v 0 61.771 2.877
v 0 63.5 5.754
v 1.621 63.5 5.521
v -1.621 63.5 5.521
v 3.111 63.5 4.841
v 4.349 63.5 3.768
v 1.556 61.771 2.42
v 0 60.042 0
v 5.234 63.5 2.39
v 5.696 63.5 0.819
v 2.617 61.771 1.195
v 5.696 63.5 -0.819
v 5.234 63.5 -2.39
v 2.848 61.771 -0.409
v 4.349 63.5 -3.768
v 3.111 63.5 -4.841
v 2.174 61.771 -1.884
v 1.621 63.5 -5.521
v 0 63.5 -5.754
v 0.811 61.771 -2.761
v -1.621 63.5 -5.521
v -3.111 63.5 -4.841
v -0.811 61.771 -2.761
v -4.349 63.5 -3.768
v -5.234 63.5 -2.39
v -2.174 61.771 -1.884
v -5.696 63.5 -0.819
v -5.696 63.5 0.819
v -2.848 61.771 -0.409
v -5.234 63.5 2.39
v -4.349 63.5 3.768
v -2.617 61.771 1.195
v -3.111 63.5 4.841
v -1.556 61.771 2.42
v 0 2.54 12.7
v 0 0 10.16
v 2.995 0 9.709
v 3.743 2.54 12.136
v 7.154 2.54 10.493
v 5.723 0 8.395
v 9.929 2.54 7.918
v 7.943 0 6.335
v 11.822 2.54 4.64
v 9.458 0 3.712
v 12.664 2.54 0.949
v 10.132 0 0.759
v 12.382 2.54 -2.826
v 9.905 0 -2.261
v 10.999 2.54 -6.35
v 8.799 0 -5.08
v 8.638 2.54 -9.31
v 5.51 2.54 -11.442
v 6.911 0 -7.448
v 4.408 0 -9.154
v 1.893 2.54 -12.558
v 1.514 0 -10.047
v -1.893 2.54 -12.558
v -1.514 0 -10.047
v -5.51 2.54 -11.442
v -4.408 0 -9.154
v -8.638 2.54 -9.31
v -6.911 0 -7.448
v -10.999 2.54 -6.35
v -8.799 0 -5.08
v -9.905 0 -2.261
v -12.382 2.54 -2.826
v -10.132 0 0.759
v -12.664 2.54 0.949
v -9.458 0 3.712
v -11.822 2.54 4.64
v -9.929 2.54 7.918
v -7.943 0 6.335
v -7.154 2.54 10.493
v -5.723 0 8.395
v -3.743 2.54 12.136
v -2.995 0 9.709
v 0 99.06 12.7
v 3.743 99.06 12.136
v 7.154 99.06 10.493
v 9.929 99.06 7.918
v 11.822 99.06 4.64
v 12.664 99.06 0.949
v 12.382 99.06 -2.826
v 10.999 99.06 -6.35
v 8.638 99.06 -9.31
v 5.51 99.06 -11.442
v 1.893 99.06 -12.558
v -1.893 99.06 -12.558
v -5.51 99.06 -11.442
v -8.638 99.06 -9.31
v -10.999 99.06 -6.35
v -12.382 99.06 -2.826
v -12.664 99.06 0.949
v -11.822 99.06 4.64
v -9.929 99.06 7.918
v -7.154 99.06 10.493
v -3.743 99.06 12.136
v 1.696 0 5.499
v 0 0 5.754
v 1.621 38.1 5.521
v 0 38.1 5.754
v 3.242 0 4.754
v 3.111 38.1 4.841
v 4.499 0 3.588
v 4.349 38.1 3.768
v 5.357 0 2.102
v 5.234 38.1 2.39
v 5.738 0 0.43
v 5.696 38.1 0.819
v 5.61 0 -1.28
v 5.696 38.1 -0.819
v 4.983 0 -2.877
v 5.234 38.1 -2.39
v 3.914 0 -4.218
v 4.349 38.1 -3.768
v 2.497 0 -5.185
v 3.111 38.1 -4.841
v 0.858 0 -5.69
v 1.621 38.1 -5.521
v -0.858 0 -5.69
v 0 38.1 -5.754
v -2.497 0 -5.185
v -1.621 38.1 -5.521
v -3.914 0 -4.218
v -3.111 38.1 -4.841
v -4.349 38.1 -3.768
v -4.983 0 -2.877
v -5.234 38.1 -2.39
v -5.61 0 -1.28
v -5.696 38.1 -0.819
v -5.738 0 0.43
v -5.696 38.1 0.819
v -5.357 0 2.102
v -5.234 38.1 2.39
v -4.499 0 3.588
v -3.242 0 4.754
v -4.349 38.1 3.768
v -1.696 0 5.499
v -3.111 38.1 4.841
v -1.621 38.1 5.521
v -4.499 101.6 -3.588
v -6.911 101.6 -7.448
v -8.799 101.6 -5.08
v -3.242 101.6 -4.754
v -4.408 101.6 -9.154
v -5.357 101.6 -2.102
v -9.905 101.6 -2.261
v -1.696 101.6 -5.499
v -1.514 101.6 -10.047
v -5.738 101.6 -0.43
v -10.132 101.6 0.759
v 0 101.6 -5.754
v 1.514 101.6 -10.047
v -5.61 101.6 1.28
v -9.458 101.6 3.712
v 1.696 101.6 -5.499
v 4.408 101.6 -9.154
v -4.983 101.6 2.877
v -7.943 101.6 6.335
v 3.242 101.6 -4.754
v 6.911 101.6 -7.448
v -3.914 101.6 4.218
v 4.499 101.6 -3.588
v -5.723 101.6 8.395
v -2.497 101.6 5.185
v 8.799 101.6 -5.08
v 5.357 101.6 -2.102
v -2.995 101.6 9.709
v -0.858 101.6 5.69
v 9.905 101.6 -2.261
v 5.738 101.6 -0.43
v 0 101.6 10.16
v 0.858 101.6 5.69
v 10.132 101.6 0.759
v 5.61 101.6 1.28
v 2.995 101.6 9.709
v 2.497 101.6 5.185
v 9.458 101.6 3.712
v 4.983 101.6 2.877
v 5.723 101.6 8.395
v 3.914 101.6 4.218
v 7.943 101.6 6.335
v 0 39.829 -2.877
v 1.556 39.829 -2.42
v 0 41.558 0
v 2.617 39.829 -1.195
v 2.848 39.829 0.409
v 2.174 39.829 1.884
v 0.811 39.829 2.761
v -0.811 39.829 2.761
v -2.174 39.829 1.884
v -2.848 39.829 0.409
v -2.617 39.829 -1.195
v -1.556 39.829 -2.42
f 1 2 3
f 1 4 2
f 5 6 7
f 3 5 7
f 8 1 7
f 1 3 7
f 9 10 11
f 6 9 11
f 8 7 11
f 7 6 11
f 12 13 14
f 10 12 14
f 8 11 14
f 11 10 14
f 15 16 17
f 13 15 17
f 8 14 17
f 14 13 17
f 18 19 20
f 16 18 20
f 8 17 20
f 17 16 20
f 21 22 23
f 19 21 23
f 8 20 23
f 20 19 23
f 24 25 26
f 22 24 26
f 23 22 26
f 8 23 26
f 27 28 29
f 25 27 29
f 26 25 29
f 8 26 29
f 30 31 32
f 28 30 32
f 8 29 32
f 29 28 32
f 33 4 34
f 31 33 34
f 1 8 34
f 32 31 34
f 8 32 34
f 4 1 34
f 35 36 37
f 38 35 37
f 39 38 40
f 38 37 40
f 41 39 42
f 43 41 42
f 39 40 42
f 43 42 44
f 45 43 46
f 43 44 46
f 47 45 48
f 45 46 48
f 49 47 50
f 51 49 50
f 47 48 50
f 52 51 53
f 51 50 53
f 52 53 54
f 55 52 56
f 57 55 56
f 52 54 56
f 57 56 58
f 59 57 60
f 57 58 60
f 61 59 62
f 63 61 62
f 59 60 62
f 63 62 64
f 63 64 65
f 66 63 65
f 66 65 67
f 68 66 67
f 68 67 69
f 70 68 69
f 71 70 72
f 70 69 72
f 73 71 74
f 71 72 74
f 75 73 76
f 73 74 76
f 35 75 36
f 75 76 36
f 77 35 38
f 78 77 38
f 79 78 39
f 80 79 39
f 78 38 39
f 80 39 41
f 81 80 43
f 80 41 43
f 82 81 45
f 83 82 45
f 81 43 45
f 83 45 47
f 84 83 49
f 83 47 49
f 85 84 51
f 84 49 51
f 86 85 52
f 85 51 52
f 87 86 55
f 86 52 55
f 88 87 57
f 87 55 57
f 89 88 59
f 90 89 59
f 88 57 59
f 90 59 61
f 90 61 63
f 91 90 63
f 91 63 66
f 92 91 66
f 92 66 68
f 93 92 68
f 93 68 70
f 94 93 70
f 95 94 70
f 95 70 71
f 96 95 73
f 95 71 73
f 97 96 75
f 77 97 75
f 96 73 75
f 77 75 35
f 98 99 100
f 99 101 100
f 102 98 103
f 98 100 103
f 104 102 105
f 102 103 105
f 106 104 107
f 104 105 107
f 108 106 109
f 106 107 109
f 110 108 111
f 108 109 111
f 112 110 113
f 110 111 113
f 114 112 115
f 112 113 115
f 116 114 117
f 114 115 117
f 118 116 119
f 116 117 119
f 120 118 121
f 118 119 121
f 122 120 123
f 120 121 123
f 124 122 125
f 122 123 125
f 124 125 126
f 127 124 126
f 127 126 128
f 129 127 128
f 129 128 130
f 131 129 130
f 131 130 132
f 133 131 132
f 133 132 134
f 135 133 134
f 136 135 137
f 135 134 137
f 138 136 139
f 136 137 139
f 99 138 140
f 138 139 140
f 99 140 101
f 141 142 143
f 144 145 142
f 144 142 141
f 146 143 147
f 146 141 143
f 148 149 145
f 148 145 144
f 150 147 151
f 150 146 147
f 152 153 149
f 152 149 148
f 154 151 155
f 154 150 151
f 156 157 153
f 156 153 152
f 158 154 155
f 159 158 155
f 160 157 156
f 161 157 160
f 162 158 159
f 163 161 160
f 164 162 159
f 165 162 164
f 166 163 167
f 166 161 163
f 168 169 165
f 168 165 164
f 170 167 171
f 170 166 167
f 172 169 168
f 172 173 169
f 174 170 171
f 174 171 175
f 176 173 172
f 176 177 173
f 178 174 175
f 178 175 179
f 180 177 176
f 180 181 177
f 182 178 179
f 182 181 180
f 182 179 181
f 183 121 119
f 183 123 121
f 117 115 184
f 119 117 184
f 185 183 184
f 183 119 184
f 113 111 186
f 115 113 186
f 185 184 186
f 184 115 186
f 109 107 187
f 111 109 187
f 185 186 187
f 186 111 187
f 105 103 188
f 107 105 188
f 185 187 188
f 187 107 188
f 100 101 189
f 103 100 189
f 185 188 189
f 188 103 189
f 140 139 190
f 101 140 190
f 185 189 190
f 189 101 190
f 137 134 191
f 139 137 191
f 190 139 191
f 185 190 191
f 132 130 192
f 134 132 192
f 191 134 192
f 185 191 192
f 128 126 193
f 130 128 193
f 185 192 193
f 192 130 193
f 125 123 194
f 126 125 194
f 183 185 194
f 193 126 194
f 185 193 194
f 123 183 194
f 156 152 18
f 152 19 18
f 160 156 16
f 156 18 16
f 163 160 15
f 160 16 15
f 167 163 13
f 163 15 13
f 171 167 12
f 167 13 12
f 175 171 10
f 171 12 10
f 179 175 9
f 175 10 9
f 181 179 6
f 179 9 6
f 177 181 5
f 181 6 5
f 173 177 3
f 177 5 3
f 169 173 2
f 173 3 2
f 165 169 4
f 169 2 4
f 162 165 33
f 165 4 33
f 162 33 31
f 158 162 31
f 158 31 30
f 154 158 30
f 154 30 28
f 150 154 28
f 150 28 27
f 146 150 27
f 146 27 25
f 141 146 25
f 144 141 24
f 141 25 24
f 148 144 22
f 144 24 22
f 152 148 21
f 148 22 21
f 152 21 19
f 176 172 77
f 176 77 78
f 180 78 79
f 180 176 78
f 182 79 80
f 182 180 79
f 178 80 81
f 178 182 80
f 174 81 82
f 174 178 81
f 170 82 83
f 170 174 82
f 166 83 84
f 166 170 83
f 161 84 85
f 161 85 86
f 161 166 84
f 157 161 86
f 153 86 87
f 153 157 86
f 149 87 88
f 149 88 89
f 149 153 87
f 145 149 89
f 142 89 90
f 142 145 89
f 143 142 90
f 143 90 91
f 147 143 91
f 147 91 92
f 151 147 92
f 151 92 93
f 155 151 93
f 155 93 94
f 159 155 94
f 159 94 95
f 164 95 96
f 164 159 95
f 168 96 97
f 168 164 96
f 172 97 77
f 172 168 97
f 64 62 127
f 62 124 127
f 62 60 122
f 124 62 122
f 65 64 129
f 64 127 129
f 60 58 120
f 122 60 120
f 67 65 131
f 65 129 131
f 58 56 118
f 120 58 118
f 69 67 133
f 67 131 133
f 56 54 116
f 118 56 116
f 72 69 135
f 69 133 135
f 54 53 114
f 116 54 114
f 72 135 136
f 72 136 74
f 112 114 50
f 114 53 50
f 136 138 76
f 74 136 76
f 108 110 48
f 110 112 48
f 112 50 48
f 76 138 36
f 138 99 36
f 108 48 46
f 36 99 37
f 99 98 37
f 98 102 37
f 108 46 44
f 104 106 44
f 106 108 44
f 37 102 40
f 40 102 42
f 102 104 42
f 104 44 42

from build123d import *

# Parameters (mm, degrees)
SKETCH1_R                   = 12.7
BOSS_EXTRUDE1_DEPTH         = 101.6
F_1_2_20_TAPPED_HOLE1_D     = 11.50874
F_1_2_20_TAPPED_HOLE1_DEPTH = 38.1
F_1_2_20_TAPPED_HOLE1_TIP   = 3.45757432
F_1_2_20_TAPPED_HOLE2_D     = 11.50874
F_1_2_20_TAPPED_HOLE2_DEPTH = 38.1
F_1_2_20_TAPPED_HOLE2_TIP   = 3.45757432
CHAMFER1_SIZE               = 2.54


with BuildPart() as part:
    # Sketch1 → Boss-Extrude1 (new body)
    with BuildSketch(Plane(origin=(0, 0, 0), x_dir=(1, 0, 0), z_dir=(0, 1, 0))):
        with Locations(Location((0, 0, 0), (0, 0, 270))):
            Circle(SKETCH1_R)
    extrude(amount=BOSS_EXTRUDE1_DEPTH)

    # 1/2-20 Tapped Hole1
    with Locations(Plane.ZX.offset(101.6)):
        with Locations((0, 0)):
            Hole(F_1_2_20_TAPPED_HOLE1_D / 2, depth=F_1_2_20_TAPPED_HOLE1_DEPTH)
            with Locations((0, 0, -(F_1_2_20_TAPPED_HOLE1_DEPTH + F_1_2_20_TAPPED_HOLE1_TIP / 2))):  # 118° drill point
                Cone(0, F_1_2_20_TAPPED_HOLE1_D / 2, F_1_2_20_TAPPED_HOLE1_TIP, mode=Mode.SUBTRACT)

    # 1/2-20 Tapped Hole2
    with Locations(Plane(origin=(0, 0, 0), x_dir=(0, 0, -1), z_dir=(0, -1, 0))):
        with Locations((0, 0)):
            Hole(F_1_2_20_TAPPED_HOLE2_D / 2, depth=F_1_2_20_TAPPED_HOLE2_DEPTH)
            with Locations((0, 0, -(F_1_2_20_TAPPED_HOLE2_DEPTH + F_1_2_20_TAPPED_HOLE2_TIP / 2))):  # 118° drill point
                Cone(0, F_1_2_20_TAPPED_HOLE2_D / 2, F_1_2_20_TAPPED_HOLE2_TIP, mode=Mode.SUBTRACT)

    # Chamfer1
    chamfer1_edges = [part.edges().sort_by_distance(p)[0] for p in [
        (0, 0, -12.7),
        (0, 101.6, -12.7),
    ]]
    chamfer(chamfer1_edges, length=CHAMFER1_SIZE)


solid = part.part
